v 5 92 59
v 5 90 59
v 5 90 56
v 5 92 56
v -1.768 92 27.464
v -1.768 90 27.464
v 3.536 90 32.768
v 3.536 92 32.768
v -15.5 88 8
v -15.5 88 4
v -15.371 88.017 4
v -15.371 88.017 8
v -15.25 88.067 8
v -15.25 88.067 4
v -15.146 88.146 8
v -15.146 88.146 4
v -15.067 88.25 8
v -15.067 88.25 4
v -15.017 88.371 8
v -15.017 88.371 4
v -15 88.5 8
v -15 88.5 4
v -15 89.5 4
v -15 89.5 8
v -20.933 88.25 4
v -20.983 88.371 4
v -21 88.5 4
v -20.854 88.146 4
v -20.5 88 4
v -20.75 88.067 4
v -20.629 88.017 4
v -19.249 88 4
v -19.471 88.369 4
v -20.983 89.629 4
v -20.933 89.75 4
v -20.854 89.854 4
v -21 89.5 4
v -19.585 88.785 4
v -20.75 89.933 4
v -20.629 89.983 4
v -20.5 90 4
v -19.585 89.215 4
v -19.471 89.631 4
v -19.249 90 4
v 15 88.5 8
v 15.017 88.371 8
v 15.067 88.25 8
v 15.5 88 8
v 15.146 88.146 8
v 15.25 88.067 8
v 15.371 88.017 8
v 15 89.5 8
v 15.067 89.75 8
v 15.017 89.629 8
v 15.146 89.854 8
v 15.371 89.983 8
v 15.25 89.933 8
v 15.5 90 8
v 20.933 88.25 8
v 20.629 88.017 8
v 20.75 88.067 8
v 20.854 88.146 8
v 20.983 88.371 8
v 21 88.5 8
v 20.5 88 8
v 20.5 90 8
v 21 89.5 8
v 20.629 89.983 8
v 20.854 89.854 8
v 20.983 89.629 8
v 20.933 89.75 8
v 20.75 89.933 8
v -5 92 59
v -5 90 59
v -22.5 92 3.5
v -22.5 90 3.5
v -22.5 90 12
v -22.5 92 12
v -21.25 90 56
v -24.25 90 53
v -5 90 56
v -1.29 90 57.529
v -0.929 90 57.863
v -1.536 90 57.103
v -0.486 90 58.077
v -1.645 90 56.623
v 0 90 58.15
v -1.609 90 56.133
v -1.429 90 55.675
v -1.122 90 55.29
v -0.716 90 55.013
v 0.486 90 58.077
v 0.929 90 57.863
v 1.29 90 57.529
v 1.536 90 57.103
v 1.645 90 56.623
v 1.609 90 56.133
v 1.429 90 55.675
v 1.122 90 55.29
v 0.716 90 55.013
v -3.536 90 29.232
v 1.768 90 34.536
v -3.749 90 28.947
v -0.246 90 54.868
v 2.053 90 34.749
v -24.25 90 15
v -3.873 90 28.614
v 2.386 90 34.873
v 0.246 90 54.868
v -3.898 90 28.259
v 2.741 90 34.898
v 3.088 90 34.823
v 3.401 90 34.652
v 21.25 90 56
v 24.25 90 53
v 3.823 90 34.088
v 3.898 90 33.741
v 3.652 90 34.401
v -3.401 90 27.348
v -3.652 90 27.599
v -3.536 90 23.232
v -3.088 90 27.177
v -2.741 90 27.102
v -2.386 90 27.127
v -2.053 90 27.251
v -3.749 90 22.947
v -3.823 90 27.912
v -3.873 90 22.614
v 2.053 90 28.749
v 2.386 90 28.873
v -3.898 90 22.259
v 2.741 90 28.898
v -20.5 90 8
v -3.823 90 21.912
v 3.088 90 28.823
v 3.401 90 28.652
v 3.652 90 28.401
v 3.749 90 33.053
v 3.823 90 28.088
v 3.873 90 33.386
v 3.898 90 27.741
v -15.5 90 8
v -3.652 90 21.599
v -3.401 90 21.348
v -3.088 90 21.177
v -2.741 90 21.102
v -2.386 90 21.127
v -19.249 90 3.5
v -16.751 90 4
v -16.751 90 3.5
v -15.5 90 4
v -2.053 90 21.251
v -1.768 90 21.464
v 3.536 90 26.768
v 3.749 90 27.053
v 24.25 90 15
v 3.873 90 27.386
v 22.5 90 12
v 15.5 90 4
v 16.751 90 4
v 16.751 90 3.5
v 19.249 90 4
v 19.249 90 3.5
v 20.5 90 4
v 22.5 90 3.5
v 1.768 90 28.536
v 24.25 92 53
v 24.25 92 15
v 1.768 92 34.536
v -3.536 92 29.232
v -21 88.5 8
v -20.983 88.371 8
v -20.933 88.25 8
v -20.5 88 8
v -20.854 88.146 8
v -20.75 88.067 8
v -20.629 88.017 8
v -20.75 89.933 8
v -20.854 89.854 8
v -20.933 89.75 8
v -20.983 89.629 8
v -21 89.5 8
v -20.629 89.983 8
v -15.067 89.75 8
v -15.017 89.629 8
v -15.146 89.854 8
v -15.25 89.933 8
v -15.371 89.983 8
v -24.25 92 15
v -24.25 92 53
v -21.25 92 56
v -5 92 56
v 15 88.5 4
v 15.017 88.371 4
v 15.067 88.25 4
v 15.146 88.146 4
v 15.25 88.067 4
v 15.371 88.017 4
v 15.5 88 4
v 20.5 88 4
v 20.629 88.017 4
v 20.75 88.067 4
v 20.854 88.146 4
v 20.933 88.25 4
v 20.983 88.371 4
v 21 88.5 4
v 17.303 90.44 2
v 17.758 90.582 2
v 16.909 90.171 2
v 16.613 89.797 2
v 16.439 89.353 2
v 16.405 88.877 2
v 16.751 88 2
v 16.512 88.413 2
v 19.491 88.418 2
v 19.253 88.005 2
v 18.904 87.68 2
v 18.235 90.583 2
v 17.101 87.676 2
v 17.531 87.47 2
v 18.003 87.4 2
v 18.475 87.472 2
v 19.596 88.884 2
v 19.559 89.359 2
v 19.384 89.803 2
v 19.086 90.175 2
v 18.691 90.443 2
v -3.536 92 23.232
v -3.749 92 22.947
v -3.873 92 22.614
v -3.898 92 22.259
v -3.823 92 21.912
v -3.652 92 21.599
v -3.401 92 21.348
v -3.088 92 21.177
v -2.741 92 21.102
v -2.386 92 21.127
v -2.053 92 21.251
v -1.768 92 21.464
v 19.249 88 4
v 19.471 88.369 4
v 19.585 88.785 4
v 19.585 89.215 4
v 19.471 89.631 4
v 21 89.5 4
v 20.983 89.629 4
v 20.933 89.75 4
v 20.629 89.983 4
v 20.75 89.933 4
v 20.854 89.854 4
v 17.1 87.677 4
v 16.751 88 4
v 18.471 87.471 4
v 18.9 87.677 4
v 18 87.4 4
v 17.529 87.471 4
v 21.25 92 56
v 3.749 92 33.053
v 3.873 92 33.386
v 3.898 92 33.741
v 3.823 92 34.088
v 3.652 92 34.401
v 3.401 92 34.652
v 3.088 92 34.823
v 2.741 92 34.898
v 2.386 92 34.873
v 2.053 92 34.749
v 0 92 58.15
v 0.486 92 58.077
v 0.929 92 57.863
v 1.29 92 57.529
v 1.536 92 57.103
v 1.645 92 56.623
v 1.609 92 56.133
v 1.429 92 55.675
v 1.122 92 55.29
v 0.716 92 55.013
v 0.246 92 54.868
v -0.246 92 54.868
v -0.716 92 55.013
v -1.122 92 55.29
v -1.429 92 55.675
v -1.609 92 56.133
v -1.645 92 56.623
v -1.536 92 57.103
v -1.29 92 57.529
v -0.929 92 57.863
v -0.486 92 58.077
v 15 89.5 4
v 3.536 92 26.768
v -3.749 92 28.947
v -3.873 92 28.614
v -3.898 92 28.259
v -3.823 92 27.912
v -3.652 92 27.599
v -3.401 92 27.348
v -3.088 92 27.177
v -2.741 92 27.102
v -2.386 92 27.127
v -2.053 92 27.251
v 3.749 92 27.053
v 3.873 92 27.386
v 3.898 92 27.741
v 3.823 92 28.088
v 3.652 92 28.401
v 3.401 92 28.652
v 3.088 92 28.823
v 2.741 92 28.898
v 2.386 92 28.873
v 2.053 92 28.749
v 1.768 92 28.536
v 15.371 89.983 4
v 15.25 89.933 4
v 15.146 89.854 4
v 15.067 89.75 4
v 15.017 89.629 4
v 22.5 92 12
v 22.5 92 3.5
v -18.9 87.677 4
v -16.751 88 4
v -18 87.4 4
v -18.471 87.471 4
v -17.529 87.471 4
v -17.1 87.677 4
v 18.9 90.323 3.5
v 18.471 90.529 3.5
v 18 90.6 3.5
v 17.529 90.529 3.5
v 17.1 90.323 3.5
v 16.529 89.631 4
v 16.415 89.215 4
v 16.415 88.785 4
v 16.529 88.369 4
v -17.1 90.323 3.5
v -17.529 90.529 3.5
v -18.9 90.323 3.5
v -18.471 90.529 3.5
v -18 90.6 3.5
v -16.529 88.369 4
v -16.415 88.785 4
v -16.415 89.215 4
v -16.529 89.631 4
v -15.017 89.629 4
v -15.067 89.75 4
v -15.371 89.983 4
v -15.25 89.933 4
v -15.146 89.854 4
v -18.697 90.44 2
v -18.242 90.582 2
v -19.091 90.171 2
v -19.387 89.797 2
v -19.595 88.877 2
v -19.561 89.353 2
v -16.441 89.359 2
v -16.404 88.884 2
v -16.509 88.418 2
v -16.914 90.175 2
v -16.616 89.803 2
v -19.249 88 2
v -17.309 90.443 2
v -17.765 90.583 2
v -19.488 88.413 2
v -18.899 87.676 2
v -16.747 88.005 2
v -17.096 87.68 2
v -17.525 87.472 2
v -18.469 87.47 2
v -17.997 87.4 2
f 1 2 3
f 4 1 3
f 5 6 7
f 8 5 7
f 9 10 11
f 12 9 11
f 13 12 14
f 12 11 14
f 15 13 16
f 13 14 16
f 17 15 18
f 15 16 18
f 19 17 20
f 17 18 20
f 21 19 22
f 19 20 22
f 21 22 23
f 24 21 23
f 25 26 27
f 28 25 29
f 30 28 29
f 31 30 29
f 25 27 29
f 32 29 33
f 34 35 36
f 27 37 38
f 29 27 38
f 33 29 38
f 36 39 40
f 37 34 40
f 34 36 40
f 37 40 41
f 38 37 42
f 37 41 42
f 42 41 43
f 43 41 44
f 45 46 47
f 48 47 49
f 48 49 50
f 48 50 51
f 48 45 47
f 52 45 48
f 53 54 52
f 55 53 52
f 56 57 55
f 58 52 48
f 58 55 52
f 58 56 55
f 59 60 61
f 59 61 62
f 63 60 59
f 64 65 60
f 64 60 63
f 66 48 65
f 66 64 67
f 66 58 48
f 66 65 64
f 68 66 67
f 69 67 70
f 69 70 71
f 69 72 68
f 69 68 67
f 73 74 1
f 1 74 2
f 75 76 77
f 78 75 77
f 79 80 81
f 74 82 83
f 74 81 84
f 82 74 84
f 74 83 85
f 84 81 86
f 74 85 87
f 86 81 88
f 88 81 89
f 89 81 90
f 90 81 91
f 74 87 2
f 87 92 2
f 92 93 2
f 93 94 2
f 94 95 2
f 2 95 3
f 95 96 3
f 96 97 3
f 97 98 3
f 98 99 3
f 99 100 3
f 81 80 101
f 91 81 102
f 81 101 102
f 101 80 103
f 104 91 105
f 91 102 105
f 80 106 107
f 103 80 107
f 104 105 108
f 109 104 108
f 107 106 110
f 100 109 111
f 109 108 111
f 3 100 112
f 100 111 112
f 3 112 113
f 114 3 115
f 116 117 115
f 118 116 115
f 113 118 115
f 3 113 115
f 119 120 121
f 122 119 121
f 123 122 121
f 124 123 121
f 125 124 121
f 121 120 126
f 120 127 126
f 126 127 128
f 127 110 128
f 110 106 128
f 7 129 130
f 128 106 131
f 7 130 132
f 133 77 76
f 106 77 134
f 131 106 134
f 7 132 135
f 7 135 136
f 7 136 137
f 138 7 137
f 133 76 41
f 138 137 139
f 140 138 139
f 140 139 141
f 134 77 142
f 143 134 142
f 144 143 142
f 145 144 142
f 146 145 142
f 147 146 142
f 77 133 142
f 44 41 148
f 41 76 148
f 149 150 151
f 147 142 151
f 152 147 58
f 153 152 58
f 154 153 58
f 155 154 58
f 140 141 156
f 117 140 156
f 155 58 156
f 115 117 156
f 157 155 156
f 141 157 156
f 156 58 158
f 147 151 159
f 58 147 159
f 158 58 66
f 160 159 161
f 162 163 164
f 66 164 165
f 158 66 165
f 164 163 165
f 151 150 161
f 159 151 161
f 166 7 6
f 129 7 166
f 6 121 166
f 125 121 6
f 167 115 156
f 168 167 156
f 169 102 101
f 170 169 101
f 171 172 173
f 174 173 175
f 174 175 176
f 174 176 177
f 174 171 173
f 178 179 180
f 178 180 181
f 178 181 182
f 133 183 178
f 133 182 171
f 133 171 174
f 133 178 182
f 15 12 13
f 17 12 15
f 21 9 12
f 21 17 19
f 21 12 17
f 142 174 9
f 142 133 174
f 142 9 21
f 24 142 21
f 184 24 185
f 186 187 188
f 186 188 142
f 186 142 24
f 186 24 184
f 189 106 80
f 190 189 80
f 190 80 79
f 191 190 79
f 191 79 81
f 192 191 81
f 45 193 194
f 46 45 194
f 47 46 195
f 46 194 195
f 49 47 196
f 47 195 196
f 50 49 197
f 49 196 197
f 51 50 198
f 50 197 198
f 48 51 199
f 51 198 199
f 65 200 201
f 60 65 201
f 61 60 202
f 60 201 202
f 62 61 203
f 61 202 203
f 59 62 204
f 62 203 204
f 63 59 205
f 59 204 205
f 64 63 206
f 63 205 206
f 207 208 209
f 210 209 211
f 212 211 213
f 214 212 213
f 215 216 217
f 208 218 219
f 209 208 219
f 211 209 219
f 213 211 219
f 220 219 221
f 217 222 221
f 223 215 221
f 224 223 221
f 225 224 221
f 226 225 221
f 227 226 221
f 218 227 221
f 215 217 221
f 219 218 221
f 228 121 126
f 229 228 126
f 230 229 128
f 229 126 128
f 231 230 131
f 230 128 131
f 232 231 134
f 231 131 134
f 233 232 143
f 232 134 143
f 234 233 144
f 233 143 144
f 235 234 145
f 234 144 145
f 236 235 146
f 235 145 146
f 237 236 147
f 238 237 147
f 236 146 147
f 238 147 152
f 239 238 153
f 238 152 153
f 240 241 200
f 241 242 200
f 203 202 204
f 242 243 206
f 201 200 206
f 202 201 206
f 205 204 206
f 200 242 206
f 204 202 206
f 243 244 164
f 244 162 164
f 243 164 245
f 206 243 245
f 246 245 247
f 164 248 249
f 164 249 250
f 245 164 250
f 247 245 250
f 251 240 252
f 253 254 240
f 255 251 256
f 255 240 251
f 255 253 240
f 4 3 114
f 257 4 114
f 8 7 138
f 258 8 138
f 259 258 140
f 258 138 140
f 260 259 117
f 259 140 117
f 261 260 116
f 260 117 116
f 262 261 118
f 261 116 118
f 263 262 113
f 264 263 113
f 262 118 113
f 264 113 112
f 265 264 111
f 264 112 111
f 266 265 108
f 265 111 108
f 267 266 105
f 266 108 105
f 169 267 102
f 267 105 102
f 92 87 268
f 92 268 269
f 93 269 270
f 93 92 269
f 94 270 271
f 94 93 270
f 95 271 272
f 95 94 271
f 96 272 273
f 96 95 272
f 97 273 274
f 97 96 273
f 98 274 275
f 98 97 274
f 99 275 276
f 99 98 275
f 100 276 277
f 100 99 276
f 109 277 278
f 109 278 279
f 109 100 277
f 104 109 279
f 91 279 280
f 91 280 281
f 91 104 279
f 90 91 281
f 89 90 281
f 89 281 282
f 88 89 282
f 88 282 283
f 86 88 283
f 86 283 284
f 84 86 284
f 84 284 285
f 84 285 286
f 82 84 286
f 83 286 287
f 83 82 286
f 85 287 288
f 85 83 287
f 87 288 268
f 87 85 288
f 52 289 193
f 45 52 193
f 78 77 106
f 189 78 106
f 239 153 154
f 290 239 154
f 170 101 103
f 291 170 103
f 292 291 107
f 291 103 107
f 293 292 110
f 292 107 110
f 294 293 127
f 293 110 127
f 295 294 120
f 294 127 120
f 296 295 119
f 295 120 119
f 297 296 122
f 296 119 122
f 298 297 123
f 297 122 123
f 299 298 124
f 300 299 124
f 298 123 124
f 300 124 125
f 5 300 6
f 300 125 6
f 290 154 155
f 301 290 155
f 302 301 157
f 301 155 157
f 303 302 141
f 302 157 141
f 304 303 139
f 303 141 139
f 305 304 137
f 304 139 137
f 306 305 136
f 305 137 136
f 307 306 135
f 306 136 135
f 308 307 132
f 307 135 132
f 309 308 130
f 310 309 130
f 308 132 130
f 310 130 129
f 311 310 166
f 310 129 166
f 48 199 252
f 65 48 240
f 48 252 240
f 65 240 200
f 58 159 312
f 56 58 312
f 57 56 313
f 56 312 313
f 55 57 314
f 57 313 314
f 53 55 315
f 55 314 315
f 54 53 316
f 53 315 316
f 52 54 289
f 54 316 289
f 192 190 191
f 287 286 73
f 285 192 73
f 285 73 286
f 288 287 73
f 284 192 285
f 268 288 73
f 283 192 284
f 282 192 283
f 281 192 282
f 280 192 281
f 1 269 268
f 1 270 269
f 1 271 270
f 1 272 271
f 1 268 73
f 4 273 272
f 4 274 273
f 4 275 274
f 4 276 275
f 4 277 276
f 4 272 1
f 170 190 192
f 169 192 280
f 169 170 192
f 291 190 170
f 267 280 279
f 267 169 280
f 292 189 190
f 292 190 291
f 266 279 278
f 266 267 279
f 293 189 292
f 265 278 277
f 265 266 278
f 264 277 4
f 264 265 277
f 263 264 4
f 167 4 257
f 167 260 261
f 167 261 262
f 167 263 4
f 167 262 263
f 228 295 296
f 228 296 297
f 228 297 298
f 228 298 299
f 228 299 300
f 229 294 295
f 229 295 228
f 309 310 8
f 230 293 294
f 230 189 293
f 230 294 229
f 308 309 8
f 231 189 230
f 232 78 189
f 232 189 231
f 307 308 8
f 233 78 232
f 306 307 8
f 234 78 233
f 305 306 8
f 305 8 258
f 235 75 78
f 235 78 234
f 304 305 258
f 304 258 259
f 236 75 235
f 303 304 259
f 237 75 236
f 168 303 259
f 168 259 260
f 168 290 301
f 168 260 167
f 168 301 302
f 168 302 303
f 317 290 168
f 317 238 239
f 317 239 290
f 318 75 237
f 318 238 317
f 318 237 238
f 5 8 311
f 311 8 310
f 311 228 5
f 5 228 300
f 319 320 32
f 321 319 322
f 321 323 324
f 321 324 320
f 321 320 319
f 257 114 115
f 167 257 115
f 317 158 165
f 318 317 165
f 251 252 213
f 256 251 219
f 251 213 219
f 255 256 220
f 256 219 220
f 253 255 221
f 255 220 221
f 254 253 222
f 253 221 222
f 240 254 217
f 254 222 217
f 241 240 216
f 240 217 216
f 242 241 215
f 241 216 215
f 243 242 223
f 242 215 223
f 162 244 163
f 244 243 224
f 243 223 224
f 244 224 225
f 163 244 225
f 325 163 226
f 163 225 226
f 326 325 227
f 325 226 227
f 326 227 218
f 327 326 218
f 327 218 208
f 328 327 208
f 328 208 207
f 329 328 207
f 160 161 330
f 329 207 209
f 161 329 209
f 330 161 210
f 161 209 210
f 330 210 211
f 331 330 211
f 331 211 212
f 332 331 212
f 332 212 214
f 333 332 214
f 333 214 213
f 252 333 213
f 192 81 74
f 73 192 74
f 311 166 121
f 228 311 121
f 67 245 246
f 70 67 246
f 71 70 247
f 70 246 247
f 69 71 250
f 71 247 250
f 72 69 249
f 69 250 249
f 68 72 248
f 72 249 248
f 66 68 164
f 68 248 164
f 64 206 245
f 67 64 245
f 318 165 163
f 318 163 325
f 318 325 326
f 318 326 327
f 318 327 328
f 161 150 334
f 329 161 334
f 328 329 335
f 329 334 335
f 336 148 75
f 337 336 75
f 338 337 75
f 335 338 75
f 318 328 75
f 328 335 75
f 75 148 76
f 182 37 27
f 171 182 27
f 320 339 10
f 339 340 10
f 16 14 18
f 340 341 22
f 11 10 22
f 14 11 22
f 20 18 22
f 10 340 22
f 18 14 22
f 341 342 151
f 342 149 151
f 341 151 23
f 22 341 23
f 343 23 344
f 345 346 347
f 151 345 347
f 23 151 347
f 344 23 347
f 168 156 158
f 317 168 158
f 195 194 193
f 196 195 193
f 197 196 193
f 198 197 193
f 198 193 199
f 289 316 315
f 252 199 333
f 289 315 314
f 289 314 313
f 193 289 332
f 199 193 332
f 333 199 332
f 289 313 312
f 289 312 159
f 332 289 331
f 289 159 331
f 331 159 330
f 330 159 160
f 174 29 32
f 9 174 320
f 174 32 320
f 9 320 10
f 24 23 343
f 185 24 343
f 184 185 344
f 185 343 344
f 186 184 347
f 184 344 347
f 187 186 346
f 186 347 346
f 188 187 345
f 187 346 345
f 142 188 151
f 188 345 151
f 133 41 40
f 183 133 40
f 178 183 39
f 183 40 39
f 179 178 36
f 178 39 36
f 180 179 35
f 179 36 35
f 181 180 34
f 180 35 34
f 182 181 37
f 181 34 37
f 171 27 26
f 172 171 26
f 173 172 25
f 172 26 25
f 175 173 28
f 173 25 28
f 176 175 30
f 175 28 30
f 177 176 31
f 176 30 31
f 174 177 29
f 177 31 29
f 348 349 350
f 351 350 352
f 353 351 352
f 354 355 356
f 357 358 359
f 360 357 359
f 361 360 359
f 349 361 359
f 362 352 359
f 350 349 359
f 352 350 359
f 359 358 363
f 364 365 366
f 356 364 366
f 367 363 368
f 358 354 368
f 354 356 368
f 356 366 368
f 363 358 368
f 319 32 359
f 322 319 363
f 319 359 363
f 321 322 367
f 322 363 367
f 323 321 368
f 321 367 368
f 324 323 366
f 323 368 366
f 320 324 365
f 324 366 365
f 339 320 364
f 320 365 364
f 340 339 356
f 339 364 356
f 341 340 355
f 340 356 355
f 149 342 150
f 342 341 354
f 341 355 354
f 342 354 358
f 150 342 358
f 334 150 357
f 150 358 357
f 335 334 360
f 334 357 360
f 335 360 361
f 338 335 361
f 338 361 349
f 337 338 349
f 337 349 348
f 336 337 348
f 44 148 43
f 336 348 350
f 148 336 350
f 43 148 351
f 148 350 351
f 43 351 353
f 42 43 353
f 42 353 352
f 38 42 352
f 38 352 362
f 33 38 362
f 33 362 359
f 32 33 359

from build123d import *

# Parameters (mm, degrees)
EXTRUDE_START        = 90
SKETCH_1_R           = 1.65
EXTRUDE_262_DEPTH    = 2
EXTRUDE_START_2      = 4
EXTRUDE_1_DEPTH      = 4
D3P2_1_START         = 2
SKETCH_3_R           = 1.6
D3P2_1_DEPTH         = 2
EXTRUDE_1_2_DEPTH    = 4
SKETCH_5_R           = 1.6
D3P2_1_2_DEPTH       = 2
CUT_EXTRUDE_START    = 90
CUT_EXTRUDE_45_DEPTH = 2


with BuildPart() as part:
    # 草图1 → Extrude 262 (new body)
    with BuildSketch(Plane(origin=(0, 0, 0), x_dir=(1, 0, 0), z_dir=(0, 1, 0)).offset(EXTRUDE_START)):
        Polygon((-22.5, -3.5), (-22.5, -12), (-24.25, -15), (-24.25, -53), (-21.25, -56), (-5, -56), (-5, -59), (5, -59), (5, -56), (21.25, -56), (24.25, -53), (24.25, -15), (22.5, -12), (22.5, -3.5), align=None)
        with Locations(Location((0, -56.5, 0), (0, 0, 270))):
            Circle(SKETCH_1_R, mode=Mode.SUBTRACT)
    extrude(amount=EXTRUDE_262_DEPTH)

    # 草图2 → Extrude 1 (add)
    with BuildSketch(Plane.XY.offset(EXTRUDE_START_2)):
        with BuildLine():
            Line((-20.5, 88), (-15.5, 88))
            ThreePointArc((-15.5, 88), (-15.146446609, 88.146446609), (-15, 88.5))
            Line((-15, 88.5), (-15, 89.5))
            ThreePointArc((-15, 89.5), (-15.146446609, 89.853553391), (-15.5, 90))
            Line((-15.5, 90), (-20.5, 90))
            ThreePointArc((-20.5, 90), (-20.853553391, 89.853553391), (-21, 89.5))
            Line((-21, 89.5), (-21, 88.5))
            ThreePointArc((-21, 88.5), (-20.853553391, 88.146446609), (-20.5, 88))
        make_face()
    extrude(amount=EXTRUDE_1_DEPTH)

    # 草图3 → D3p2_-1 (add)
    with BuildSketch(Plane.XY.offset(D3P2_1_START)):
        with Locations(Location((-18, 89, 0), (0, 0, 218.682187453))):
            Circle(SKETCH_3_R)
    extrude(amount=D3P2_1_DEPTH)

    # 草图4 → Extrude 1 2 (add)
    with BuildSketch(Plane.XY.offset(EXTRUDE_START_2)):
        with BuildLine():
            Line((15.5, 88), (20.5, 88))
            ThreePointArc((20.5, 88), (20.853553391, 88.146446609), (21, 88.5))
            Line((21, 88.5), (21, 89.5))
            ThreePointArc((21, 89.5), (20.853553391, 89.853553391), (20.5, 90))
            Line((20.5, 90), (15.5, 90))
            ThreePointArc((15.5, 90), (15.146446609, 89.853553391), (15, 89.5))
            Line((15, 89.5), (15, 88.5))
            ThreePointArc((15, 88.5), (15.146446609, 88.146446609), (15.5, 88))
        make_face()
    extrude(amount=EXTRUDE_1_2_DEPTH)

    # 草图5 → D3p2_1 2 (add)
    with BuildSketch(Plane.XY.offset(D3P2_1_START)):
        with Locations(Location((18, 89, 0), (0, 0, 218.682187453))):
            Circle(SKETCH_5_R)
    extrude(amount=D3P2_1_2_DEPTH)

    # 草图6 → 后盖45度平行通气孔 (cut)
    with BuildSketch(Plane(origin=(0, 0, 0), x_dir=(1, 0, 0), z_dir=(0, 1, 0)).offset(CUT_EXTRUDE_START)):
        with BuildLine():
            Line((-1.767766953, -21.464466094), (3.535533906, -26.767766953))
            ThreePointArc((3.535533906, -26.767766953), (3.535533906, -28.535533906), (1.767766953, -28.535533906))
            Line((1.767766953, -28.535533906), (-3.535533906, -23.232233047))
            ThreePointArc((-3.535533906, -23.232233047), (-3.535533906, -21.464466094), (-1.767766953, -21.464466094))
        make_face()
        with BuildLine():
            Line((-1.767766953, -27.464466094), (3.535533906, -32.767766953))
            ThreePointArc((3.535533906, -32.767766953), (3.535533906, -34.535533906), (1.767766953, -34.535533906))
            Line((1.767766953, -34.535533906), (-3.535533906, -29.232233047))
            ThreePointArc((-3.535533906, -29.232233047), (-3.535533906, -27.464466094), (-1.767766953, -27.464466094))
        make_face()
    extrude(amount=CUT_EXTRUDE_45_DEPTH, mode=Mode.SUBTRACT)


solid = part.part
